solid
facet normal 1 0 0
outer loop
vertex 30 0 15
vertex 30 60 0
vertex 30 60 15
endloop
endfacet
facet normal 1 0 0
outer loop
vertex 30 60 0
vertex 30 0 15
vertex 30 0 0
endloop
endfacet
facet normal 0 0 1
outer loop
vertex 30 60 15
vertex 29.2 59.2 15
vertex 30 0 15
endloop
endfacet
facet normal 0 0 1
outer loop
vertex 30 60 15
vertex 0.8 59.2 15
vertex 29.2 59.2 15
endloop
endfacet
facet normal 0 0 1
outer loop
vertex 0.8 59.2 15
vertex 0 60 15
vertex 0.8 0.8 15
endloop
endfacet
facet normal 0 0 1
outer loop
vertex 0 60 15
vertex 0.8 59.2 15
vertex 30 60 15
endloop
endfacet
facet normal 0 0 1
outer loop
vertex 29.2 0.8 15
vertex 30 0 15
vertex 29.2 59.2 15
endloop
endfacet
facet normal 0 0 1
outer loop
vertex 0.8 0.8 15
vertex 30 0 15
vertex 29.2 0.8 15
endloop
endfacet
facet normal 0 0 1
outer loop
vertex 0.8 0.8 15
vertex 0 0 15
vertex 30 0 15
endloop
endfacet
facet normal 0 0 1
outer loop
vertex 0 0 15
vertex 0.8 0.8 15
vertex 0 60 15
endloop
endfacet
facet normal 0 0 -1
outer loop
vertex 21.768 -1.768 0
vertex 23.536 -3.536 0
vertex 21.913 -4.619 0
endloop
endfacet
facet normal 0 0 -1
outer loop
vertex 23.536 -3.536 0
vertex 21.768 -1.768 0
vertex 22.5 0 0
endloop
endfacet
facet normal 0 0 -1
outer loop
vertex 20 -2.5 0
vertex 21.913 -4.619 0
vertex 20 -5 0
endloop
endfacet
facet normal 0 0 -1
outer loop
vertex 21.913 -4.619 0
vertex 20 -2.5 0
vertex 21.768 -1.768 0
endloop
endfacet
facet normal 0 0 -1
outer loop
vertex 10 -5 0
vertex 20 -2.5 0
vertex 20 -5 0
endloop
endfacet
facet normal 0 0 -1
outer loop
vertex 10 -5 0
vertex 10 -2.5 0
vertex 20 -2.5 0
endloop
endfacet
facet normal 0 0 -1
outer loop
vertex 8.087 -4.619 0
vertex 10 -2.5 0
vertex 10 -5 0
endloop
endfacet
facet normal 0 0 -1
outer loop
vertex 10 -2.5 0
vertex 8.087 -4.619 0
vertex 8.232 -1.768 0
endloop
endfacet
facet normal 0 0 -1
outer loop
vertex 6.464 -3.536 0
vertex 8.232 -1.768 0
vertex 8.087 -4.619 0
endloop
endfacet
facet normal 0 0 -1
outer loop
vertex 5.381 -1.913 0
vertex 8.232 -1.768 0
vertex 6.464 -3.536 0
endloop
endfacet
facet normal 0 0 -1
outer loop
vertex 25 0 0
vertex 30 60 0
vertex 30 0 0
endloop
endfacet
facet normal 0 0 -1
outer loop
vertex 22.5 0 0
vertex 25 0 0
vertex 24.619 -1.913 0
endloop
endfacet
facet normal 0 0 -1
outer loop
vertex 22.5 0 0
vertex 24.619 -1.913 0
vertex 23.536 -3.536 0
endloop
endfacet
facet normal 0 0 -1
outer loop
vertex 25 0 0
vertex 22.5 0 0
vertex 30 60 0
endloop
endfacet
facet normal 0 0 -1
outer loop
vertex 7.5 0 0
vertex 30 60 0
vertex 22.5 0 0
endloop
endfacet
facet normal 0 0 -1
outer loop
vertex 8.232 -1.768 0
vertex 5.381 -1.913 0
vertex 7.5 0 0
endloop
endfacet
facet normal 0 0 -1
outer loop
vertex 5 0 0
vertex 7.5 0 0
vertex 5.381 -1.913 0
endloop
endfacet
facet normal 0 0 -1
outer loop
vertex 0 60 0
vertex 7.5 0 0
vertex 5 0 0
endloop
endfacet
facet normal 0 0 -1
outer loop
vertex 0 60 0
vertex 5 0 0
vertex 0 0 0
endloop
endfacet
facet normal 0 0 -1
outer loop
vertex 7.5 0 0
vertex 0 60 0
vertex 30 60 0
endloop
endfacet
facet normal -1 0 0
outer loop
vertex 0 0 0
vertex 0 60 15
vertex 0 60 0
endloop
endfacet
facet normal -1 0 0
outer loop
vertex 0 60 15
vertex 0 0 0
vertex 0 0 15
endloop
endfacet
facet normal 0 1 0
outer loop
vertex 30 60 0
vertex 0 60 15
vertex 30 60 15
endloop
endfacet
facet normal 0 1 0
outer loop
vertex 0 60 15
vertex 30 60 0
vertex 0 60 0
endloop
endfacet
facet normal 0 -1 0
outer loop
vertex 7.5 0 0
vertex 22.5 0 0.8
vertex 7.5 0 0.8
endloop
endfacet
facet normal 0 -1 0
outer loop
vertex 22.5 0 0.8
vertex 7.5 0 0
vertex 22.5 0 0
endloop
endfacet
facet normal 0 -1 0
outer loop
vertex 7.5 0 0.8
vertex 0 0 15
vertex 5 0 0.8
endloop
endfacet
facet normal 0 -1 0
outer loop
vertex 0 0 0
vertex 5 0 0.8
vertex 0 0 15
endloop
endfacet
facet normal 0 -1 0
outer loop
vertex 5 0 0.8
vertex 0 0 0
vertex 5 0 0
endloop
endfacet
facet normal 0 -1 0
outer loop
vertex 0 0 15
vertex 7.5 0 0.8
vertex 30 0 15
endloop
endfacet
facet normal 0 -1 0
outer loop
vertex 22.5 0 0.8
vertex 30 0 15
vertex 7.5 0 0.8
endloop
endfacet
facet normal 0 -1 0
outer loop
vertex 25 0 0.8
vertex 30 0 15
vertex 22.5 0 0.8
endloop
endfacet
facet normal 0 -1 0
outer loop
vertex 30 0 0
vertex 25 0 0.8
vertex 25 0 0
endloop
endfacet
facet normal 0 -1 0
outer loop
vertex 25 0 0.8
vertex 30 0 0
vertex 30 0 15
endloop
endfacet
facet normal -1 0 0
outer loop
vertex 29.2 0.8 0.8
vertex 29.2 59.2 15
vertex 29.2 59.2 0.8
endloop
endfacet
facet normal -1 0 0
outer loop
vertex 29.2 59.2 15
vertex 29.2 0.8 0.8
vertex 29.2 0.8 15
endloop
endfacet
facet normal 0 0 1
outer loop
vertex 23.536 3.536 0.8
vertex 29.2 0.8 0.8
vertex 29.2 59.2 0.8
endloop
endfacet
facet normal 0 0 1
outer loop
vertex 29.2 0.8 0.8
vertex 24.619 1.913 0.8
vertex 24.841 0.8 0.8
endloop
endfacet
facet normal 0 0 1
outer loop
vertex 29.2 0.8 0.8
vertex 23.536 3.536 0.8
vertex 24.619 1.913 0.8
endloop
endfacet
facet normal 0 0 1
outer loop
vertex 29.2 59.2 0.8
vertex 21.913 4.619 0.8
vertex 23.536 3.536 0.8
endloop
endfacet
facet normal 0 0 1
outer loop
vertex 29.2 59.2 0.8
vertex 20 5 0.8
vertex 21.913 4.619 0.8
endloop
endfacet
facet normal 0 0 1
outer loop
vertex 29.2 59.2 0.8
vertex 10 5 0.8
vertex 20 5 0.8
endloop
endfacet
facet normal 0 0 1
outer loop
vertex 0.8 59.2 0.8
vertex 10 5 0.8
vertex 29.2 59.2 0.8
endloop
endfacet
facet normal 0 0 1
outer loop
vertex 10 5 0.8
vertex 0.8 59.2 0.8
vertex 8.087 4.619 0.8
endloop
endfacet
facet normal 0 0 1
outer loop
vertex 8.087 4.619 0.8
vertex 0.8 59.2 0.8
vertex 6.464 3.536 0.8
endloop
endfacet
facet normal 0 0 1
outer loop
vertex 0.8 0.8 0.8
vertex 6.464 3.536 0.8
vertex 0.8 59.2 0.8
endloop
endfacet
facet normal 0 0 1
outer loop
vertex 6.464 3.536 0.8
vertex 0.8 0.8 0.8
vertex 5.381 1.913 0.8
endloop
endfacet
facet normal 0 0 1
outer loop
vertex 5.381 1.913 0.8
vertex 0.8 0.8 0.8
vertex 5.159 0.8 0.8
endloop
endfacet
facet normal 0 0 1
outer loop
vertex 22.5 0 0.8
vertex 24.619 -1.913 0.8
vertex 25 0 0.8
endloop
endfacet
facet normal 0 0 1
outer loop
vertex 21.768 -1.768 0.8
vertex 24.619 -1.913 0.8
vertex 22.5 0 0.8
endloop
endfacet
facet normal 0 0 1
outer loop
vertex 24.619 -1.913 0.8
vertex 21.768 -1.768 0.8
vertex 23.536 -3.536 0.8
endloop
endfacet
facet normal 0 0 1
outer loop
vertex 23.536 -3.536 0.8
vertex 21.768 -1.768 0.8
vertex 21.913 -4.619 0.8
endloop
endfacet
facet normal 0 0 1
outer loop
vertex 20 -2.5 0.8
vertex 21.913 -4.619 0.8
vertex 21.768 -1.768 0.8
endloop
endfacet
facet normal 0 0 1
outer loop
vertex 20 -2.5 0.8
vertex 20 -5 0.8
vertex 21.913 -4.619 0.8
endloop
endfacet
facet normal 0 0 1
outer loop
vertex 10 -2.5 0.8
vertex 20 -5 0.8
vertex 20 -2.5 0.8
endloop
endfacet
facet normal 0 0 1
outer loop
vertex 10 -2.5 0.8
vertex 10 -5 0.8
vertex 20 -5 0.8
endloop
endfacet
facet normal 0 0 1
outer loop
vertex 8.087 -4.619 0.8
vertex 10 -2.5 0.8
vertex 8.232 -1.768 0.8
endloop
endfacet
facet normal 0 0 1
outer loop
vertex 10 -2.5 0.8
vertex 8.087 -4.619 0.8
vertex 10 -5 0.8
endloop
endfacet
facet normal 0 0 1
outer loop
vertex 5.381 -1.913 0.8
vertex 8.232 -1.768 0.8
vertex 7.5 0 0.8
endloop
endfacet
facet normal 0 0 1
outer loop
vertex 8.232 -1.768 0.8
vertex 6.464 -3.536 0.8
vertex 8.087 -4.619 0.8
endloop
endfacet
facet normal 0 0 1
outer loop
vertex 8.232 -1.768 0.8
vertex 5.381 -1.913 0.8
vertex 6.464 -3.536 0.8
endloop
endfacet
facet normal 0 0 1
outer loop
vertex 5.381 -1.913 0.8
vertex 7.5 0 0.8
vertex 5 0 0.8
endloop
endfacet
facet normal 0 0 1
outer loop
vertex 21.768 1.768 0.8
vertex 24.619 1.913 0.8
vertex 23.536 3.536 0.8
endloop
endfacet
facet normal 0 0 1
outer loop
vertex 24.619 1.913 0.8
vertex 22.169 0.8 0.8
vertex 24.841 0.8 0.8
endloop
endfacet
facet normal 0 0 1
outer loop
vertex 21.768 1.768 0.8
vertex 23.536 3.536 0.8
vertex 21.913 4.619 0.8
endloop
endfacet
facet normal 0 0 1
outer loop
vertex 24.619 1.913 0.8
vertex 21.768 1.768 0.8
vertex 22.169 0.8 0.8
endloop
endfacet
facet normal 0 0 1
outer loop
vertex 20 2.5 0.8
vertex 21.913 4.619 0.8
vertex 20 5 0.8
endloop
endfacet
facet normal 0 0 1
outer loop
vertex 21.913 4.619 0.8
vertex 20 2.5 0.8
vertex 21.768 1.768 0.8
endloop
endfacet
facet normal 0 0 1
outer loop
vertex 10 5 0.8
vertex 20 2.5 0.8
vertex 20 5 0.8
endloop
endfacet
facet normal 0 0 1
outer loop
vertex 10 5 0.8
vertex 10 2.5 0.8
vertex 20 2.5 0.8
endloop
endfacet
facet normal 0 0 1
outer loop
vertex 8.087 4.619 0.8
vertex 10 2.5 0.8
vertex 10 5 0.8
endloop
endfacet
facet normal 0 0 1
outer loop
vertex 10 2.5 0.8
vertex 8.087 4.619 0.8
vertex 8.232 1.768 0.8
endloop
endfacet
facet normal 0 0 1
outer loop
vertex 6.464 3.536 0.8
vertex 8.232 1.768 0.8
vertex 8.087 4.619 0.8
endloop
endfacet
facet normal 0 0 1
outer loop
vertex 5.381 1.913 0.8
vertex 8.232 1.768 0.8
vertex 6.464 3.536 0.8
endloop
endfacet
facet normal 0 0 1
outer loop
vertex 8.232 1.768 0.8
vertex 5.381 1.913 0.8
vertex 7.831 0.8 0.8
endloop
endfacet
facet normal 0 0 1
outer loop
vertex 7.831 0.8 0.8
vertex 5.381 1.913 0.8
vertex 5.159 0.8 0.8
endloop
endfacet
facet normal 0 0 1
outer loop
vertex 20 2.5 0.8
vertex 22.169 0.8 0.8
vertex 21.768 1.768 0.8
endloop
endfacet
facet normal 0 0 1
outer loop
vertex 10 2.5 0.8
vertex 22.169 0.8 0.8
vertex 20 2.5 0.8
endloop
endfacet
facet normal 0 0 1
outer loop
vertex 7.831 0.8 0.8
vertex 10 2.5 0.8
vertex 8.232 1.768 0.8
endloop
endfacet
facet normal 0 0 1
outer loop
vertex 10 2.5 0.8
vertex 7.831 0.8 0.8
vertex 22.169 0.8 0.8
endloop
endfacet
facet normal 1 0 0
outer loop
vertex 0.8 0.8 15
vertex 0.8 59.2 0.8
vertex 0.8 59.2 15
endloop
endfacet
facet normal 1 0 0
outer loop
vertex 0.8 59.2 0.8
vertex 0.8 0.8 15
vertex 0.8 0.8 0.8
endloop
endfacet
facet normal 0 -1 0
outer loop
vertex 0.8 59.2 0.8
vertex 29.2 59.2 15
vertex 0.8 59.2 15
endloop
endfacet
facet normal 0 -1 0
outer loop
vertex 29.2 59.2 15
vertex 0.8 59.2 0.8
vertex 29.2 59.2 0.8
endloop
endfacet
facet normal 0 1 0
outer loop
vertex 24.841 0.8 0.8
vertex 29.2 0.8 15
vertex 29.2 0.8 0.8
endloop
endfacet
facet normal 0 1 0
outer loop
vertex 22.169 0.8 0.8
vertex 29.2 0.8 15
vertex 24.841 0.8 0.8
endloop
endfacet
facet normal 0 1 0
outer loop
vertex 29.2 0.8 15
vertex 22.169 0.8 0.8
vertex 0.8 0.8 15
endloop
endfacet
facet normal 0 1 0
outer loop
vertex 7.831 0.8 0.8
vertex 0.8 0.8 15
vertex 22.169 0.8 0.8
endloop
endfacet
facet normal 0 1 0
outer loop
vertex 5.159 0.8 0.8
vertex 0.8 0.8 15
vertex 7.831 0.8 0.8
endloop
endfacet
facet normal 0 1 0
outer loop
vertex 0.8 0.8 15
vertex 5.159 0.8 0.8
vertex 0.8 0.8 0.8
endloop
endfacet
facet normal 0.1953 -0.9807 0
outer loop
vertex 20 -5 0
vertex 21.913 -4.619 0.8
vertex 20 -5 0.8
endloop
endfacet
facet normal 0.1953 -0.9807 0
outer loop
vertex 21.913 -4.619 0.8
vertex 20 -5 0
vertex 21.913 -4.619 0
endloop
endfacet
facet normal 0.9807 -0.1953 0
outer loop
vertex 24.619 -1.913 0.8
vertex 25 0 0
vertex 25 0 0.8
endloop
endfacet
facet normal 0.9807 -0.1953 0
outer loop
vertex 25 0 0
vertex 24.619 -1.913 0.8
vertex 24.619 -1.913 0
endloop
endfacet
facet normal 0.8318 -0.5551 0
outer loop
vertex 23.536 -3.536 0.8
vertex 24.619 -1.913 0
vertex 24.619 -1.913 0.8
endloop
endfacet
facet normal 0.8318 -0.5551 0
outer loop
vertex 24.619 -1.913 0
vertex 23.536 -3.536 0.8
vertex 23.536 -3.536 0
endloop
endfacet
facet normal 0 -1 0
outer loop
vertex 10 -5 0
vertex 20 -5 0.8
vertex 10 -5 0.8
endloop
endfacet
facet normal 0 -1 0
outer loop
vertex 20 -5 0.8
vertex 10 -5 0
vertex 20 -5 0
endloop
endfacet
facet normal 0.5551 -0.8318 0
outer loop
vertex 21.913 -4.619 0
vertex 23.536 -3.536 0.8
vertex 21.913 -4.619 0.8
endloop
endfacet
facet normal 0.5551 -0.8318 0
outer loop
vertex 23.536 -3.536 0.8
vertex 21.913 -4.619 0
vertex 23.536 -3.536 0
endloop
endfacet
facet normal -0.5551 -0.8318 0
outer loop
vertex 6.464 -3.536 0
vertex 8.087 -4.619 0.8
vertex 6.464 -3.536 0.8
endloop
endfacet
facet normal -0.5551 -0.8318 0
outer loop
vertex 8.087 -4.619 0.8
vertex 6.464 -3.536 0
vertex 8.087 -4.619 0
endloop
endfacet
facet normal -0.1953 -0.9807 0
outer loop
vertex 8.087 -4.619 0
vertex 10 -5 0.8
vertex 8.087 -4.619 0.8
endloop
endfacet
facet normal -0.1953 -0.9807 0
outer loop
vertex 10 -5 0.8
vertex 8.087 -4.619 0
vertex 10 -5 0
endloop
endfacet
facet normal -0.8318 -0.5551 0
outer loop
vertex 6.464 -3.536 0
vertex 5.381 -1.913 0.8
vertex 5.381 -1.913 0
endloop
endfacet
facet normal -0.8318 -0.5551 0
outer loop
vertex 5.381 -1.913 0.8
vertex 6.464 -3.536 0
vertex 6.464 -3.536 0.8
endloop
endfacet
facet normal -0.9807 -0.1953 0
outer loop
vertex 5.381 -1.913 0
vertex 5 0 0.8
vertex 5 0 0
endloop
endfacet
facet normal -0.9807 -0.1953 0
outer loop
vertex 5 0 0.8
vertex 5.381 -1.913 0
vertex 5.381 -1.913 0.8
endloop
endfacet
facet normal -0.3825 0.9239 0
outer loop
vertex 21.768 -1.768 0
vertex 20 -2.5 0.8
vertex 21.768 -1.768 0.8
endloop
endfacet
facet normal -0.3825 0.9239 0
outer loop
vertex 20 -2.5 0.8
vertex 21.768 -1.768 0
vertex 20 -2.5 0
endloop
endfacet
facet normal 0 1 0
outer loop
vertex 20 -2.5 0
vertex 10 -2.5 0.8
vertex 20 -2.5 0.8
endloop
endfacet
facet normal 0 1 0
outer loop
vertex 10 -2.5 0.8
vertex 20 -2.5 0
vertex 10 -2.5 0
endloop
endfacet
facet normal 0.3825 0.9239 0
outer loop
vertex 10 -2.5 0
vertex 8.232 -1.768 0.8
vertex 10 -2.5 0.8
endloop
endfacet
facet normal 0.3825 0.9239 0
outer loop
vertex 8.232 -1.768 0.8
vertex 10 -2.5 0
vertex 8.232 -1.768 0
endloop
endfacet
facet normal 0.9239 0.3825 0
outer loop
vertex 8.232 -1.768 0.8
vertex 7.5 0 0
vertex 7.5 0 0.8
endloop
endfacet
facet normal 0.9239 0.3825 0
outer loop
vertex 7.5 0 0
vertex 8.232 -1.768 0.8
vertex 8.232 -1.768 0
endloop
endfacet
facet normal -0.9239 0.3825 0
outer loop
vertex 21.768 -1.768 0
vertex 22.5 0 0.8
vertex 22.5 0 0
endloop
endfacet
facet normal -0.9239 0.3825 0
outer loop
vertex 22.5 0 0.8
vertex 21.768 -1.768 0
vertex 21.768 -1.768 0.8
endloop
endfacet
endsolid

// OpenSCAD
function d_wall()=0.8;
function d_szuflada()=30;
function l_szuflada()=60;

module szuflada() 
{
    difference() {
        cube([d_szuflada(),l_szuflada(),d_szuflada()/2]);
        translate( [d_wall(),d_wall(), d_wall()] )
            cube([d_szuflada()-2*d_wall(),
                    l_szuflada()-2*d_wall(),
                    d_szuflada()-d_wall()+0.01]);
    }

    difference() {
    hull() {
        translate( [d_szuflada()/2-5,0,0] )
            cylinder(r=5,h=d_wall());
        translate( [d_szuflada()/2+5,0,0] )
            cylinder(r=5,h=d_wall());
    }
    translate( [0,0,-0.1] )
    hull() {
        translate( [d_szuflada()/2-5,0,0] )
            cylinder(r=2.5,h=d_wall()+0.2);
        translate( [d_szuflada()/2+5,0,0] )
            cylinder(r=2.5,h=d_wall()+0.2);
    }
    }
}

szuflada();
